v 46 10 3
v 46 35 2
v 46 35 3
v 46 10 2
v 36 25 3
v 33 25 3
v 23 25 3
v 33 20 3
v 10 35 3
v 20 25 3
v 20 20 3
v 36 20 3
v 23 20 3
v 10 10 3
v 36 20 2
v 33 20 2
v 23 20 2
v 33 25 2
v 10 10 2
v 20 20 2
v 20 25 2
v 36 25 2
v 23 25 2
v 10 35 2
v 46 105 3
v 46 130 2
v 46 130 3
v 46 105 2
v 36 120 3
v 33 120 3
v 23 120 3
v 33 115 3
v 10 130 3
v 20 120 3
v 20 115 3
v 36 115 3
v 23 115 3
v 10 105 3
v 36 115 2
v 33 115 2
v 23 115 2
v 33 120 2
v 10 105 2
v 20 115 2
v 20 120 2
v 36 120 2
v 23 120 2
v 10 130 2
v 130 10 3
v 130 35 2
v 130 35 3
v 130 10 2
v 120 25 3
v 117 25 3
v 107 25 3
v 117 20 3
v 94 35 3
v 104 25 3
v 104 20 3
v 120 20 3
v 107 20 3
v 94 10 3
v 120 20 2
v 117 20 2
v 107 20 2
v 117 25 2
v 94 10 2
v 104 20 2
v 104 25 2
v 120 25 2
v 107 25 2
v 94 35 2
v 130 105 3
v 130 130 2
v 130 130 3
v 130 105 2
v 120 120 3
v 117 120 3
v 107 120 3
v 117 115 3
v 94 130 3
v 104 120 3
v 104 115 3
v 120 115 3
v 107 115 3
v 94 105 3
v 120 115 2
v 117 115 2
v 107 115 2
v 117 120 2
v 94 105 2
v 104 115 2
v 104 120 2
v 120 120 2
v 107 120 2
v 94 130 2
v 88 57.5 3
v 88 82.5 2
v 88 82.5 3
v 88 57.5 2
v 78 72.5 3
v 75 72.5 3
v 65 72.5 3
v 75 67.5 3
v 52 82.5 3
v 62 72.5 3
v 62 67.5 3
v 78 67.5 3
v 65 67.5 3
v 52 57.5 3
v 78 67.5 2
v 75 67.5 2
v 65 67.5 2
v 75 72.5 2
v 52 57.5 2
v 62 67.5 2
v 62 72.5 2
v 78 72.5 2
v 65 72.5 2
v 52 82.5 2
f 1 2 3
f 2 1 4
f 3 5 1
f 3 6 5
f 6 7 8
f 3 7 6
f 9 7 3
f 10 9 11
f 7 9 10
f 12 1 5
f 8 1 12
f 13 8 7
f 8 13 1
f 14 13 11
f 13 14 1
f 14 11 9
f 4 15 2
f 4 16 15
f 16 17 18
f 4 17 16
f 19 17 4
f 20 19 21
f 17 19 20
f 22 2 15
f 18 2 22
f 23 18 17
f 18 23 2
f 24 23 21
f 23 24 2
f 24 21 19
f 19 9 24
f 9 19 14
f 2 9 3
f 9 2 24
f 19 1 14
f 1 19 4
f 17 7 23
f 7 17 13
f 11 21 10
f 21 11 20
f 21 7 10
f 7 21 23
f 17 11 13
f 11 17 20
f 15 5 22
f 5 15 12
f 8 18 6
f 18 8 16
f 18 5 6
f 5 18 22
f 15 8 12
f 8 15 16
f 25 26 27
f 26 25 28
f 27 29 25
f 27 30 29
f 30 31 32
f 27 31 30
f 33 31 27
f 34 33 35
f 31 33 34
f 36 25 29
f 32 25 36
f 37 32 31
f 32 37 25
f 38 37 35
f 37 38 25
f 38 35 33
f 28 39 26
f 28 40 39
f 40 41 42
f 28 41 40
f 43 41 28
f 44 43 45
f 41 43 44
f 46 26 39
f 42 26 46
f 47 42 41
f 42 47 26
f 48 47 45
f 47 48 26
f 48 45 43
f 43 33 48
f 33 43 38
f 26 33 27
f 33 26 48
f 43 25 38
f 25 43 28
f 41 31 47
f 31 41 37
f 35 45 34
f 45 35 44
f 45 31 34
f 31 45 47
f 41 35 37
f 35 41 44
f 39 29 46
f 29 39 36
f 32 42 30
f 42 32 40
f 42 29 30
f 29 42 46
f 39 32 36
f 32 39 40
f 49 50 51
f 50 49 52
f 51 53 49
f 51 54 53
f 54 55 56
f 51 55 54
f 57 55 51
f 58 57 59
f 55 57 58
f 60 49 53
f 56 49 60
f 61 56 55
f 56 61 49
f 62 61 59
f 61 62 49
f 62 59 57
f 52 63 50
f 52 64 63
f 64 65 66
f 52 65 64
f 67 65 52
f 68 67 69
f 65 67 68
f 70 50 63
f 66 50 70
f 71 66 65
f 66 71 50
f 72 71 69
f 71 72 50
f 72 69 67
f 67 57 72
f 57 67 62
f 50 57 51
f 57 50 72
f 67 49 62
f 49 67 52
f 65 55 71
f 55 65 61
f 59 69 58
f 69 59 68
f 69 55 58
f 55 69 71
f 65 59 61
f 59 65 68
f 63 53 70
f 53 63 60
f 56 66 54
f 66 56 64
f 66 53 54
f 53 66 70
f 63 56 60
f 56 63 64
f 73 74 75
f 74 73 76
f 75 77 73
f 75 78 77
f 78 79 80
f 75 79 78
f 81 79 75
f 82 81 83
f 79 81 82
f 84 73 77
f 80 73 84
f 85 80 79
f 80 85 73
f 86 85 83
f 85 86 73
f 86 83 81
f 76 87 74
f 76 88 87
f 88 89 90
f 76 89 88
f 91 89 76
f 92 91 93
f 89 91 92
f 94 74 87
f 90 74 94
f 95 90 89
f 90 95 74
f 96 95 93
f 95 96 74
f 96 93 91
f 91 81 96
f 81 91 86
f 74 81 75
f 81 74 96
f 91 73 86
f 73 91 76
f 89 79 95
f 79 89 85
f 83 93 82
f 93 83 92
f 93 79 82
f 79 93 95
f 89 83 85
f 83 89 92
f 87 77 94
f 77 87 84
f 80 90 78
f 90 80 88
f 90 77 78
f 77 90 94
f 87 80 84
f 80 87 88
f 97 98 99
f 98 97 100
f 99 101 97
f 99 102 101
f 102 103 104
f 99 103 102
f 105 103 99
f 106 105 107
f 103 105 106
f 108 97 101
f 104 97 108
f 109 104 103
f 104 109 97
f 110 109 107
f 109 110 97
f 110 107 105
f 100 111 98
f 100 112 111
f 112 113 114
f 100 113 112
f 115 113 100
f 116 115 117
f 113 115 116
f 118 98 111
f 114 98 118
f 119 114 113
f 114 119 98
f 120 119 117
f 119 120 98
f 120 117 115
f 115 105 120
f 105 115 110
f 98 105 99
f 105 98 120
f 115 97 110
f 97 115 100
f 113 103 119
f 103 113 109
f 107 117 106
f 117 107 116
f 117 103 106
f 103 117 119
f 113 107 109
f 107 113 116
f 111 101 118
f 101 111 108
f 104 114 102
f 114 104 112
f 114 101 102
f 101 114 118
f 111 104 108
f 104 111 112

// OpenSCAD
// file: ../dimensions.scad
$fn = 256;

textOnLid = "CAMERA";
textSize = 20;
length = 140;
width = 140;
height = 45;
thickness = 2;
withInset = true;
cornerRadius = 10;
// main file
include <../dimensions.scad>

use <../Case/case.scad>

InsertPatches(length, width, cornerRadius, thickness);
